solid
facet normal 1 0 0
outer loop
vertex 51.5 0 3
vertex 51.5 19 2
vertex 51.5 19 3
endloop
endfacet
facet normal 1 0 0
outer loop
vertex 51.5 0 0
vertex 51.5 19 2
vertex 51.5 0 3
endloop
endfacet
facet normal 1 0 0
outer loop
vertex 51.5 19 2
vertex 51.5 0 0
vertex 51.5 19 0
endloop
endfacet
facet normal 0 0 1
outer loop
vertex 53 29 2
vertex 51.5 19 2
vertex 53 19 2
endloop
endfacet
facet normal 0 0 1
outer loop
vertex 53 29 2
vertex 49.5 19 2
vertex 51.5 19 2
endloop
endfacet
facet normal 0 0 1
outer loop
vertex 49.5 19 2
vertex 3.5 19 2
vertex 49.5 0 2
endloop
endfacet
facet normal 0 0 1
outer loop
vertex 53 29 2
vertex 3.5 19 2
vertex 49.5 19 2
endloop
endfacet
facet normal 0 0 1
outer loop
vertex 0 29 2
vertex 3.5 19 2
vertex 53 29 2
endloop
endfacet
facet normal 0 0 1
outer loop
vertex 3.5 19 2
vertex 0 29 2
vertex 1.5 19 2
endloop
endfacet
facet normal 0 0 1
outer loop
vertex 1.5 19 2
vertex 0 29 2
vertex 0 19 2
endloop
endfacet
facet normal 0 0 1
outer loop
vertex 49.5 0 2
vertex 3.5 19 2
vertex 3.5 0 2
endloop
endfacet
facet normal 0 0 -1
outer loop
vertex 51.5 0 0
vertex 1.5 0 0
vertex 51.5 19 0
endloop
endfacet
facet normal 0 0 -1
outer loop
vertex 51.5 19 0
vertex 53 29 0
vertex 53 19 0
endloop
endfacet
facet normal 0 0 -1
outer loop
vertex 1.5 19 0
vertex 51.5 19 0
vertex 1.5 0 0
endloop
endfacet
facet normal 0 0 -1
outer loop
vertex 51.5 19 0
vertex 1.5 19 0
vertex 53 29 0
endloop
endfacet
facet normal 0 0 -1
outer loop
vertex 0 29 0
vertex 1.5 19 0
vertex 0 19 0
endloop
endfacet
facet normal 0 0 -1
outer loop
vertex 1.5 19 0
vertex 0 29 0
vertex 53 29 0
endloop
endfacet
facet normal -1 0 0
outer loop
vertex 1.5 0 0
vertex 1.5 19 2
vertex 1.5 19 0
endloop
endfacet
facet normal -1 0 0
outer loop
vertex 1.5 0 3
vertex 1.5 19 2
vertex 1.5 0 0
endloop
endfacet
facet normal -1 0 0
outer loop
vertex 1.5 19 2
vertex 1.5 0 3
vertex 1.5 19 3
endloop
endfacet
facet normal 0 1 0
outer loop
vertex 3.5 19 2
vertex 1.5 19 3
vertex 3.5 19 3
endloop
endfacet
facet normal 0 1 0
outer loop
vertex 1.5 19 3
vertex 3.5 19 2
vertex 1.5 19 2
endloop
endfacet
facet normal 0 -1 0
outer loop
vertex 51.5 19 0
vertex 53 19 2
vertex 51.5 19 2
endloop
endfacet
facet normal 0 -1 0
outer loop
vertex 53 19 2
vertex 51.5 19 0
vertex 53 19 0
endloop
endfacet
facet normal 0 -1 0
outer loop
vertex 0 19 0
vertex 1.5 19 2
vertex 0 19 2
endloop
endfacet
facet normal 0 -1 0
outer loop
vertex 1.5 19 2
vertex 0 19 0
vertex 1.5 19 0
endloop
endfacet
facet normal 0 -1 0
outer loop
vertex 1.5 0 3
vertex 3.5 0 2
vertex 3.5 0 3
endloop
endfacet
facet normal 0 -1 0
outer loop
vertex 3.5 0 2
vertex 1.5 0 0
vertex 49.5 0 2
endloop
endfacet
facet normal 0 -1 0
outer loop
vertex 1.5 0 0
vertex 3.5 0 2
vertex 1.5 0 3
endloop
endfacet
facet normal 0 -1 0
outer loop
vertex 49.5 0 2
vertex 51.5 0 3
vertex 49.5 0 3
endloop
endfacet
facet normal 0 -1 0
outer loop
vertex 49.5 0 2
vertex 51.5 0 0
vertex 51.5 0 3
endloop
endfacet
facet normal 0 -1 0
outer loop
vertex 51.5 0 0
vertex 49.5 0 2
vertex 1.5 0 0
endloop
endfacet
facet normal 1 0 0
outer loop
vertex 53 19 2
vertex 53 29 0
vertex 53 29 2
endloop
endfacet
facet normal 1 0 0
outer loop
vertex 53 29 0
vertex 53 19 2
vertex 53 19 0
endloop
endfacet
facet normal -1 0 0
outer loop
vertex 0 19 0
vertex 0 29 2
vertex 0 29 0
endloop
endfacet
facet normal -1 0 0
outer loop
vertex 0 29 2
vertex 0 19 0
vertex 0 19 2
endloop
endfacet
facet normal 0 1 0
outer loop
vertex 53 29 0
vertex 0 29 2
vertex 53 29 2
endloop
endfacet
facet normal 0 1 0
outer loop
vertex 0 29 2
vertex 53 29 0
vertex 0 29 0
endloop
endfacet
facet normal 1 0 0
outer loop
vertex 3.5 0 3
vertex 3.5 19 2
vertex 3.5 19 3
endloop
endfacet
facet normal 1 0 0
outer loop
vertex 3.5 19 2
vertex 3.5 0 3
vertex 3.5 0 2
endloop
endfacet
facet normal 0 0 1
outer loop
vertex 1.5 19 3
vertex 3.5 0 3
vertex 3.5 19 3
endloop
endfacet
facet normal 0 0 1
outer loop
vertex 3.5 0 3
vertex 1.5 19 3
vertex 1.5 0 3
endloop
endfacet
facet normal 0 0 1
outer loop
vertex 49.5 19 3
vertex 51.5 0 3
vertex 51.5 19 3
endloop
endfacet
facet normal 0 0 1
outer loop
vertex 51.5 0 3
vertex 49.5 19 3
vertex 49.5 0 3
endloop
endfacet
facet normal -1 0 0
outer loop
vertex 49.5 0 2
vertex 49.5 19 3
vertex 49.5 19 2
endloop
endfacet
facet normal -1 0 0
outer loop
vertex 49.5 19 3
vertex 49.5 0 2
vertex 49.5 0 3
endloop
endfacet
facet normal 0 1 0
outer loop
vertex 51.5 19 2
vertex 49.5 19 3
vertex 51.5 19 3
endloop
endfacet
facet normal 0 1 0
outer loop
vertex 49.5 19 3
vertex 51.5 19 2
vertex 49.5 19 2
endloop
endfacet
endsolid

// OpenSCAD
union()
{	
	translate([1.5,0,0]) cube([50,19,2]);
	translate([0,19,0]) cube([53,10,2]);
	translate([1.5,0,2]) cube([2,19,1]);
	translate([49.5,0,2]) cube([2,19,1]);
}
